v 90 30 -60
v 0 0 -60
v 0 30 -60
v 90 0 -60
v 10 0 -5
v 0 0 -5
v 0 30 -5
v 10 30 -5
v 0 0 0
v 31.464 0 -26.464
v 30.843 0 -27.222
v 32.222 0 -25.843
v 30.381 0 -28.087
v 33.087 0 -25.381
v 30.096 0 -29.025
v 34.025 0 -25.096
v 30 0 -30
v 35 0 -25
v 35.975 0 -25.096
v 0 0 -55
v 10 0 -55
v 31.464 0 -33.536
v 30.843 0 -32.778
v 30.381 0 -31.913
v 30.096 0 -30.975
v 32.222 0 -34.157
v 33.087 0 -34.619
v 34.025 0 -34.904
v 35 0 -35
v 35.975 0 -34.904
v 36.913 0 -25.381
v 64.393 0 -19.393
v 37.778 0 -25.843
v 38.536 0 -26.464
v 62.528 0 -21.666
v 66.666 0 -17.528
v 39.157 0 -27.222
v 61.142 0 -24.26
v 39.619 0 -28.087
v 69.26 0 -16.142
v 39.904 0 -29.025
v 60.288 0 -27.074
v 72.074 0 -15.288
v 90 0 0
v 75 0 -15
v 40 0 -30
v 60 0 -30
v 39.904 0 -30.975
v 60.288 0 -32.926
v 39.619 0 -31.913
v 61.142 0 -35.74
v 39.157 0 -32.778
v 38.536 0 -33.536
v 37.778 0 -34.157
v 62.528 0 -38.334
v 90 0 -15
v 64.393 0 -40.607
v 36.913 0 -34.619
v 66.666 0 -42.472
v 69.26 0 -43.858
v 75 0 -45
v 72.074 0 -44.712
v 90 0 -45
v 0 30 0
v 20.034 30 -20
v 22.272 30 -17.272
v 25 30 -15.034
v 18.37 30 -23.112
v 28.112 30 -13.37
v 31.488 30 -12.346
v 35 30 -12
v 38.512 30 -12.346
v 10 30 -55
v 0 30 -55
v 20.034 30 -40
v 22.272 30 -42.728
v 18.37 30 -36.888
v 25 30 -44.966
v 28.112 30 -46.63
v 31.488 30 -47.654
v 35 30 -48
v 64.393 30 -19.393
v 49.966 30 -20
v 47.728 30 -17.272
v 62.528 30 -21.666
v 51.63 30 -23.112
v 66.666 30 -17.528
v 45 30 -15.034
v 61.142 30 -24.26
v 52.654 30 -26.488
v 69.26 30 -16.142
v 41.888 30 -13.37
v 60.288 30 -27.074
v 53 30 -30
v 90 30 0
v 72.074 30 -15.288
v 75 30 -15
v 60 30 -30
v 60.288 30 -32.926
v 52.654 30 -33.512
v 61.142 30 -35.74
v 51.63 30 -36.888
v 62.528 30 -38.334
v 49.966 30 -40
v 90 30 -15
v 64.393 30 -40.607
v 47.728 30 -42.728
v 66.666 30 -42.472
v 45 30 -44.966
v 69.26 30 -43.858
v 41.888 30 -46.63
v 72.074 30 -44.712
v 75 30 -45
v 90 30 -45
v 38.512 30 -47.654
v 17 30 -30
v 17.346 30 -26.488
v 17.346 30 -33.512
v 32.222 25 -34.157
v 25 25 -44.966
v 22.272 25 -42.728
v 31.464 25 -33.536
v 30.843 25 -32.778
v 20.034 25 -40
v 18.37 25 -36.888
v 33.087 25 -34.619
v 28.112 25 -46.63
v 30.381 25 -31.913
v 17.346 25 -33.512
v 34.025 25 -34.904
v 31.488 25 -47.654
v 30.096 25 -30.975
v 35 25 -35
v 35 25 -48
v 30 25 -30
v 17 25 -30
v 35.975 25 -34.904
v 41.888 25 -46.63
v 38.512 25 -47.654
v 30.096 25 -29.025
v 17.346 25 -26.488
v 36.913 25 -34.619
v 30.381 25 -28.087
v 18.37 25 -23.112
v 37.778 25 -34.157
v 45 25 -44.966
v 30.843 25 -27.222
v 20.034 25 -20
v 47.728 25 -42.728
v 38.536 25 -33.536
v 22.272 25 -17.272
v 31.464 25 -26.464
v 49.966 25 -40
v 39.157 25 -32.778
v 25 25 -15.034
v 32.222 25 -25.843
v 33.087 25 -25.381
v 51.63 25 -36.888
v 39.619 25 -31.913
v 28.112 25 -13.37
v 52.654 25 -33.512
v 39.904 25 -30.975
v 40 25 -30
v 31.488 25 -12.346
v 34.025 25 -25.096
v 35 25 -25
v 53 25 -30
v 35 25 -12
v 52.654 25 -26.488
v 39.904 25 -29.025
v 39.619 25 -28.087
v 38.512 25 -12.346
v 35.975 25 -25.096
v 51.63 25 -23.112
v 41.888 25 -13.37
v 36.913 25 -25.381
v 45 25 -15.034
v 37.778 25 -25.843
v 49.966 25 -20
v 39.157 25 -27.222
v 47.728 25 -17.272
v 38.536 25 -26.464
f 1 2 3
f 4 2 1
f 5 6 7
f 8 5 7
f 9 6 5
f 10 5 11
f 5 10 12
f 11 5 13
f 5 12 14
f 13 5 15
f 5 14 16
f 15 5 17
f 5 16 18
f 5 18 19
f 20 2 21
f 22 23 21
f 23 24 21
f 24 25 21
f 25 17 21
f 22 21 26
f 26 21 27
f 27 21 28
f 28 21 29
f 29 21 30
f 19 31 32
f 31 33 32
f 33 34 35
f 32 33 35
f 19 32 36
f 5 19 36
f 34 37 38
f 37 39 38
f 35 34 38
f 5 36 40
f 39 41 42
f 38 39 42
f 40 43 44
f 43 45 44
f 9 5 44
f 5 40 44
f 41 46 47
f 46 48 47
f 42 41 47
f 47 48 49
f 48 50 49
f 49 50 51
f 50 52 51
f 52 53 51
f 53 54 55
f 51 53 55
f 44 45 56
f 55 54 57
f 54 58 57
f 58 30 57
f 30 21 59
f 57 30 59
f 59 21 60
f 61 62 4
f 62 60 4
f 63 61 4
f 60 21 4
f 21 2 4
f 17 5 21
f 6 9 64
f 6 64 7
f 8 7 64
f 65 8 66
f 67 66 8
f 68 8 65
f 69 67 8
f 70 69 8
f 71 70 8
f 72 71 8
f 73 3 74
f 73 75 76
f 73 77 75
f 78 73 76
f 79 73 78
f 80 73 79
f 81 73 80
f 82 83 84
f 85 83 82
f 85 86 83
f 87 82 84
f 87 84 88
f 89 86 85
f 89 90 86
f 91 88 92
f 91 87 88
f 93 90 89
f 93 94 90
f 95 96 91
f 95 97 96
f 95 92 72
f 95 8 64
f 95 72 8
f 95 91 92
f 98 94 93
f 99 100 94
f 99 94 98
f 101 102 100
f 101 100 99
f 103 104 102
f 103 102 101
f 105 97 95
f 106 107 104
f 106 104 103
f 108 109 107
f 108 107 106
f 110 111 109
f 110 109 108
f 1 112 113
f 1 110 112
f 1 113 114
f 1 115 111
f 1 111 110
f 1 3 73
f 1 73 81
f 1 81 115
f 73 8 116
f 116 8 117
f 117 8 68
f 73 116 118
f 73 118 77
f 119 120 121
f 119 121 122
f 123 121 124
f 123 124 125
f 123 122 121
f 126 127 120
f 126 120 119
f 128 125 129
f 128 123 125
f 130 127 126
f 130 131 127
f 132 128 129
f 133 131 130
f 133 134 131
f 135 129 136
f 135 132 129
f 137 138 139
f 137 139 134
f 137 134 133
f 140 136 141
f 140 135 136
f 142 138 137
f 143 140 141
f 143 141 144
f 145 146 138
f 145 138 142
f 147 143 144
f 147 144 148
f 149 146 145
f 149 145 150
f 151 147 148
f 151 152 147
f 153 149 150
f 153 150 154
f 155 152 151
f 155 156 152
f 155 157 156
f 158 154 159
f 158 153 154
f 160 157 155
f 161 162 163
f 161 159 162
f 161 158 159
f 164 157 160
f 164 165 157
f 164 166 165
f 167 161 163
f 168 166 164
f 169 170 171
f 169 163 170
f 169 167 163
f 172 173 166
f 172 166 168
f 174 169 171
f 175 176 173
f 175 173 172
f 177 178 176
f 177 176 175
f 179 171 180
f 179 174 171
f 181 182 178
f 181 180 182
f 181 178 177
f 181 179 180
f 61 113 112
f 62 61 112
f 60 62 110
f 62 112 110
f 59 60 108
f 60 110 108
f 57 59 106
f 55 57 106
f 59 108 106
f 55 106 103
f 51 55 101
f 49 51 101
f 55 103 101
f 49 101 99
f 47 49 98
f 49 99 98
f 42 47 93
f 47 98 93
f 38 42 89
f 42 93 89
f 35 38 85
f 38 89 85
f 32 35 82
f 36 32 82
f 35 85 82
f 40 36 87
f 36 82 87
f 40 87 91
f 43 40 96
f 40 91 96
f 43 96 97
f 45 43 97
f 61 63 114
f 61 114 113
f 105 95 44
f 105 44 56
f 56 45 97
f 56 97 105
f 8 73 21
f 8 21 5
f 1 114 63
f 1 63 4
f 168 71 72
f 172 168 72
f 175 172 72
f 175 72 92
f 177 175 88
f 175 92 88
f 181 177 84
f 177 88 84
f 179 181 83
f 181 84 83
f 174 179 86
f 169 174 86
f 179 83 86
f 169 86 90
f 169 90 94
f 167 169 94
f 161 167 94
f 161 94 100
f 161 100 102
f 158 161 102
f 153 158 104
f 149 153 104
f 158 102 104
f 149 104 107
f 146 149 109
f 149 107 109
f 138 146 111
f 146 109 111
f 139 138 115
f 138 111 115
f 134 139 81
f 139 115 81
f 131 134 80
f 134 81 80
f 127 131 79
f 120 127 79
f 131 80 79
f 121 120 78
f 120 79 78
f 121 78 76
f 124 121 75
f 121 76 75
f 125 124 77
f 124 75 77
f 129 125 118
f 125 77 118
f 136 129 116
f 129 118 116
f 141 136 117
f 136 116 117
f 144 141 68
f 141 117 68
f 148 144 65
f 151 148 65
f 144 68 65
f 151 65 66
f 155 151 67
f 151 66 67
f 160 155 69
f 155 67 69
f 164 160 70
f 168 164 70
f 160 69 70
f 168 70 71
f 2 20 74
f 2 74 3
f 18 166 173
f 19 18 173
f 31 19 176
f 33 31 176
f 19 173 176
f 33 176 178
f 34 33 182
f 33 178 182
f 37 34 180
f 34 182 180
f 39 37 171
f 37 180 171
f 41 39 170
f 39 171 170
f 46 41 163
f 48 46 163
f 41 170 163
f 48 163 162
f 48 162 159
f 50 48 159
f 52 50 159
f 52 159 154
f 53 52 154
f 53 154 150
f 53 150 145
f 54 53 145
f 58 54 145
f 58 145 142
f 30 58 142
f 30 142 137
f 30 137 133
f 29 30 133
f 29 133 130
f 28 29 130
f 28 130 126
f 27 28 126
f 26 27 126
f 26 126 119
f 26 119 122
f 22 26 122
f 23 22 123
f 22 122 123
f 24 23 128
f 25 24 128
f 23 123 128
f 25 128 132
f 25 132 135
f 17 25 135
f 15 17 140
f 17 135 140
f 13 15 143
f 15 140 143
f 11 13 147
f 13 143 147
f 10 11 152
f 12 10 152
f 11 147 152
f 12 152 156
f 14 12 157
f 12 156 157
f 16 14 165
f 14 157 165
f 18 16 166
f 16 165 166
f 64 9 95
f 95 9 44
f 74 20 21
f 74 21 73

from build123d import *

# Parameters (mm, degrees)
ESBO_O1_W                = 90
ESBO_O1_H                = 60
RESSALTO_EXTRUS_O1_DEPTH = 30
CORTE_EXTRUS_O1_DEPTH    = 113.249721603
ESBO_O18_W               = 50
ESBO_O18_H               = 30
CORTE_EXTRUS_O2_DEPTH    = 10
ESBO_O20_R               = 5
CORTE_EXTRUS_O4_DEPTH    = 113.249721603
ESBO_O22_R               = 18
CORTE_EXTRUS_O5_DEPTH    = 5


with BuildPart() as part:
    # Esboço1 → Ressalto-extrusão1 (new body)
    with BuildSketch(Plane(origin=(0, 0, 0), x_dir=(1, 0, 0), z_dir=(0, 1, 0))):
        with Locations((45, 30)):
            Rectangle(ESBO_O1_W, ESBO_O1_H)
    extrude(amount=RESSALTO_EXTRUS_O1_DEPTH)

    # Esboço2 → Corte-extrusão1 (cut, through all)
    with BuildSketch(Plane(origin=(0, 30, 0), x_dir=(1, 0, 0), z_dir=(0, 1, 0))):
        with BuildLine():
            Line((90, 45), (75, 45))
            ThreePointArc((75, 45), (60, 30), (75, 15))
            Line((75, 15), (90, 15))
            Line((90, 15), (90, 45))
        make_face()
    extrude(amount=-CORTE_EXTRUS_O1_DEPTH, mode=Mode.SUBTRACT)

    # Esboço18 → Corte-extrusão2 (cut)
    with BuildSketch(Plane.ZY):
        with Locations((-30, 15)):
            Rectangle(ESBO_O18_W, ESBO_O18_H)
    extrude(amount=-CORTE_EXTRUS_O2_DEPTH, mode=Mode.SUBTRACT)

    # Esboço20 → Corte-extrusão4 (cut, through all)
    with BuildSketch(Plane(origin=(0, 30, 0), x_dir=(1, 0, 0), z_dir=(0, 1, 0))):
        with Locations(Location((35, 30, 0), (0, 0, 270))):
            Circle(ESBO_O20_R)
    extrude(amount=-CORTE_EXTRUS_O4_DEPTH, mode=Mode.SUBTRACT)

    # Esboço22 → Corte-extrusão5 (cut)
    with BuildSketch(Plane(origin=(0, 30, 0), x_dir=(1, 0, 0), z_dir=(0, 1, 0))):
        with Locations(Location((35, 30, 0), (0, 0, 270))):
            Circle(ESBO_O22_R)
    extrude(amount=-CORTE_EXTRUS_O5_DEPTH, mode=Mode.SUBTRACT)


solid = part.part
